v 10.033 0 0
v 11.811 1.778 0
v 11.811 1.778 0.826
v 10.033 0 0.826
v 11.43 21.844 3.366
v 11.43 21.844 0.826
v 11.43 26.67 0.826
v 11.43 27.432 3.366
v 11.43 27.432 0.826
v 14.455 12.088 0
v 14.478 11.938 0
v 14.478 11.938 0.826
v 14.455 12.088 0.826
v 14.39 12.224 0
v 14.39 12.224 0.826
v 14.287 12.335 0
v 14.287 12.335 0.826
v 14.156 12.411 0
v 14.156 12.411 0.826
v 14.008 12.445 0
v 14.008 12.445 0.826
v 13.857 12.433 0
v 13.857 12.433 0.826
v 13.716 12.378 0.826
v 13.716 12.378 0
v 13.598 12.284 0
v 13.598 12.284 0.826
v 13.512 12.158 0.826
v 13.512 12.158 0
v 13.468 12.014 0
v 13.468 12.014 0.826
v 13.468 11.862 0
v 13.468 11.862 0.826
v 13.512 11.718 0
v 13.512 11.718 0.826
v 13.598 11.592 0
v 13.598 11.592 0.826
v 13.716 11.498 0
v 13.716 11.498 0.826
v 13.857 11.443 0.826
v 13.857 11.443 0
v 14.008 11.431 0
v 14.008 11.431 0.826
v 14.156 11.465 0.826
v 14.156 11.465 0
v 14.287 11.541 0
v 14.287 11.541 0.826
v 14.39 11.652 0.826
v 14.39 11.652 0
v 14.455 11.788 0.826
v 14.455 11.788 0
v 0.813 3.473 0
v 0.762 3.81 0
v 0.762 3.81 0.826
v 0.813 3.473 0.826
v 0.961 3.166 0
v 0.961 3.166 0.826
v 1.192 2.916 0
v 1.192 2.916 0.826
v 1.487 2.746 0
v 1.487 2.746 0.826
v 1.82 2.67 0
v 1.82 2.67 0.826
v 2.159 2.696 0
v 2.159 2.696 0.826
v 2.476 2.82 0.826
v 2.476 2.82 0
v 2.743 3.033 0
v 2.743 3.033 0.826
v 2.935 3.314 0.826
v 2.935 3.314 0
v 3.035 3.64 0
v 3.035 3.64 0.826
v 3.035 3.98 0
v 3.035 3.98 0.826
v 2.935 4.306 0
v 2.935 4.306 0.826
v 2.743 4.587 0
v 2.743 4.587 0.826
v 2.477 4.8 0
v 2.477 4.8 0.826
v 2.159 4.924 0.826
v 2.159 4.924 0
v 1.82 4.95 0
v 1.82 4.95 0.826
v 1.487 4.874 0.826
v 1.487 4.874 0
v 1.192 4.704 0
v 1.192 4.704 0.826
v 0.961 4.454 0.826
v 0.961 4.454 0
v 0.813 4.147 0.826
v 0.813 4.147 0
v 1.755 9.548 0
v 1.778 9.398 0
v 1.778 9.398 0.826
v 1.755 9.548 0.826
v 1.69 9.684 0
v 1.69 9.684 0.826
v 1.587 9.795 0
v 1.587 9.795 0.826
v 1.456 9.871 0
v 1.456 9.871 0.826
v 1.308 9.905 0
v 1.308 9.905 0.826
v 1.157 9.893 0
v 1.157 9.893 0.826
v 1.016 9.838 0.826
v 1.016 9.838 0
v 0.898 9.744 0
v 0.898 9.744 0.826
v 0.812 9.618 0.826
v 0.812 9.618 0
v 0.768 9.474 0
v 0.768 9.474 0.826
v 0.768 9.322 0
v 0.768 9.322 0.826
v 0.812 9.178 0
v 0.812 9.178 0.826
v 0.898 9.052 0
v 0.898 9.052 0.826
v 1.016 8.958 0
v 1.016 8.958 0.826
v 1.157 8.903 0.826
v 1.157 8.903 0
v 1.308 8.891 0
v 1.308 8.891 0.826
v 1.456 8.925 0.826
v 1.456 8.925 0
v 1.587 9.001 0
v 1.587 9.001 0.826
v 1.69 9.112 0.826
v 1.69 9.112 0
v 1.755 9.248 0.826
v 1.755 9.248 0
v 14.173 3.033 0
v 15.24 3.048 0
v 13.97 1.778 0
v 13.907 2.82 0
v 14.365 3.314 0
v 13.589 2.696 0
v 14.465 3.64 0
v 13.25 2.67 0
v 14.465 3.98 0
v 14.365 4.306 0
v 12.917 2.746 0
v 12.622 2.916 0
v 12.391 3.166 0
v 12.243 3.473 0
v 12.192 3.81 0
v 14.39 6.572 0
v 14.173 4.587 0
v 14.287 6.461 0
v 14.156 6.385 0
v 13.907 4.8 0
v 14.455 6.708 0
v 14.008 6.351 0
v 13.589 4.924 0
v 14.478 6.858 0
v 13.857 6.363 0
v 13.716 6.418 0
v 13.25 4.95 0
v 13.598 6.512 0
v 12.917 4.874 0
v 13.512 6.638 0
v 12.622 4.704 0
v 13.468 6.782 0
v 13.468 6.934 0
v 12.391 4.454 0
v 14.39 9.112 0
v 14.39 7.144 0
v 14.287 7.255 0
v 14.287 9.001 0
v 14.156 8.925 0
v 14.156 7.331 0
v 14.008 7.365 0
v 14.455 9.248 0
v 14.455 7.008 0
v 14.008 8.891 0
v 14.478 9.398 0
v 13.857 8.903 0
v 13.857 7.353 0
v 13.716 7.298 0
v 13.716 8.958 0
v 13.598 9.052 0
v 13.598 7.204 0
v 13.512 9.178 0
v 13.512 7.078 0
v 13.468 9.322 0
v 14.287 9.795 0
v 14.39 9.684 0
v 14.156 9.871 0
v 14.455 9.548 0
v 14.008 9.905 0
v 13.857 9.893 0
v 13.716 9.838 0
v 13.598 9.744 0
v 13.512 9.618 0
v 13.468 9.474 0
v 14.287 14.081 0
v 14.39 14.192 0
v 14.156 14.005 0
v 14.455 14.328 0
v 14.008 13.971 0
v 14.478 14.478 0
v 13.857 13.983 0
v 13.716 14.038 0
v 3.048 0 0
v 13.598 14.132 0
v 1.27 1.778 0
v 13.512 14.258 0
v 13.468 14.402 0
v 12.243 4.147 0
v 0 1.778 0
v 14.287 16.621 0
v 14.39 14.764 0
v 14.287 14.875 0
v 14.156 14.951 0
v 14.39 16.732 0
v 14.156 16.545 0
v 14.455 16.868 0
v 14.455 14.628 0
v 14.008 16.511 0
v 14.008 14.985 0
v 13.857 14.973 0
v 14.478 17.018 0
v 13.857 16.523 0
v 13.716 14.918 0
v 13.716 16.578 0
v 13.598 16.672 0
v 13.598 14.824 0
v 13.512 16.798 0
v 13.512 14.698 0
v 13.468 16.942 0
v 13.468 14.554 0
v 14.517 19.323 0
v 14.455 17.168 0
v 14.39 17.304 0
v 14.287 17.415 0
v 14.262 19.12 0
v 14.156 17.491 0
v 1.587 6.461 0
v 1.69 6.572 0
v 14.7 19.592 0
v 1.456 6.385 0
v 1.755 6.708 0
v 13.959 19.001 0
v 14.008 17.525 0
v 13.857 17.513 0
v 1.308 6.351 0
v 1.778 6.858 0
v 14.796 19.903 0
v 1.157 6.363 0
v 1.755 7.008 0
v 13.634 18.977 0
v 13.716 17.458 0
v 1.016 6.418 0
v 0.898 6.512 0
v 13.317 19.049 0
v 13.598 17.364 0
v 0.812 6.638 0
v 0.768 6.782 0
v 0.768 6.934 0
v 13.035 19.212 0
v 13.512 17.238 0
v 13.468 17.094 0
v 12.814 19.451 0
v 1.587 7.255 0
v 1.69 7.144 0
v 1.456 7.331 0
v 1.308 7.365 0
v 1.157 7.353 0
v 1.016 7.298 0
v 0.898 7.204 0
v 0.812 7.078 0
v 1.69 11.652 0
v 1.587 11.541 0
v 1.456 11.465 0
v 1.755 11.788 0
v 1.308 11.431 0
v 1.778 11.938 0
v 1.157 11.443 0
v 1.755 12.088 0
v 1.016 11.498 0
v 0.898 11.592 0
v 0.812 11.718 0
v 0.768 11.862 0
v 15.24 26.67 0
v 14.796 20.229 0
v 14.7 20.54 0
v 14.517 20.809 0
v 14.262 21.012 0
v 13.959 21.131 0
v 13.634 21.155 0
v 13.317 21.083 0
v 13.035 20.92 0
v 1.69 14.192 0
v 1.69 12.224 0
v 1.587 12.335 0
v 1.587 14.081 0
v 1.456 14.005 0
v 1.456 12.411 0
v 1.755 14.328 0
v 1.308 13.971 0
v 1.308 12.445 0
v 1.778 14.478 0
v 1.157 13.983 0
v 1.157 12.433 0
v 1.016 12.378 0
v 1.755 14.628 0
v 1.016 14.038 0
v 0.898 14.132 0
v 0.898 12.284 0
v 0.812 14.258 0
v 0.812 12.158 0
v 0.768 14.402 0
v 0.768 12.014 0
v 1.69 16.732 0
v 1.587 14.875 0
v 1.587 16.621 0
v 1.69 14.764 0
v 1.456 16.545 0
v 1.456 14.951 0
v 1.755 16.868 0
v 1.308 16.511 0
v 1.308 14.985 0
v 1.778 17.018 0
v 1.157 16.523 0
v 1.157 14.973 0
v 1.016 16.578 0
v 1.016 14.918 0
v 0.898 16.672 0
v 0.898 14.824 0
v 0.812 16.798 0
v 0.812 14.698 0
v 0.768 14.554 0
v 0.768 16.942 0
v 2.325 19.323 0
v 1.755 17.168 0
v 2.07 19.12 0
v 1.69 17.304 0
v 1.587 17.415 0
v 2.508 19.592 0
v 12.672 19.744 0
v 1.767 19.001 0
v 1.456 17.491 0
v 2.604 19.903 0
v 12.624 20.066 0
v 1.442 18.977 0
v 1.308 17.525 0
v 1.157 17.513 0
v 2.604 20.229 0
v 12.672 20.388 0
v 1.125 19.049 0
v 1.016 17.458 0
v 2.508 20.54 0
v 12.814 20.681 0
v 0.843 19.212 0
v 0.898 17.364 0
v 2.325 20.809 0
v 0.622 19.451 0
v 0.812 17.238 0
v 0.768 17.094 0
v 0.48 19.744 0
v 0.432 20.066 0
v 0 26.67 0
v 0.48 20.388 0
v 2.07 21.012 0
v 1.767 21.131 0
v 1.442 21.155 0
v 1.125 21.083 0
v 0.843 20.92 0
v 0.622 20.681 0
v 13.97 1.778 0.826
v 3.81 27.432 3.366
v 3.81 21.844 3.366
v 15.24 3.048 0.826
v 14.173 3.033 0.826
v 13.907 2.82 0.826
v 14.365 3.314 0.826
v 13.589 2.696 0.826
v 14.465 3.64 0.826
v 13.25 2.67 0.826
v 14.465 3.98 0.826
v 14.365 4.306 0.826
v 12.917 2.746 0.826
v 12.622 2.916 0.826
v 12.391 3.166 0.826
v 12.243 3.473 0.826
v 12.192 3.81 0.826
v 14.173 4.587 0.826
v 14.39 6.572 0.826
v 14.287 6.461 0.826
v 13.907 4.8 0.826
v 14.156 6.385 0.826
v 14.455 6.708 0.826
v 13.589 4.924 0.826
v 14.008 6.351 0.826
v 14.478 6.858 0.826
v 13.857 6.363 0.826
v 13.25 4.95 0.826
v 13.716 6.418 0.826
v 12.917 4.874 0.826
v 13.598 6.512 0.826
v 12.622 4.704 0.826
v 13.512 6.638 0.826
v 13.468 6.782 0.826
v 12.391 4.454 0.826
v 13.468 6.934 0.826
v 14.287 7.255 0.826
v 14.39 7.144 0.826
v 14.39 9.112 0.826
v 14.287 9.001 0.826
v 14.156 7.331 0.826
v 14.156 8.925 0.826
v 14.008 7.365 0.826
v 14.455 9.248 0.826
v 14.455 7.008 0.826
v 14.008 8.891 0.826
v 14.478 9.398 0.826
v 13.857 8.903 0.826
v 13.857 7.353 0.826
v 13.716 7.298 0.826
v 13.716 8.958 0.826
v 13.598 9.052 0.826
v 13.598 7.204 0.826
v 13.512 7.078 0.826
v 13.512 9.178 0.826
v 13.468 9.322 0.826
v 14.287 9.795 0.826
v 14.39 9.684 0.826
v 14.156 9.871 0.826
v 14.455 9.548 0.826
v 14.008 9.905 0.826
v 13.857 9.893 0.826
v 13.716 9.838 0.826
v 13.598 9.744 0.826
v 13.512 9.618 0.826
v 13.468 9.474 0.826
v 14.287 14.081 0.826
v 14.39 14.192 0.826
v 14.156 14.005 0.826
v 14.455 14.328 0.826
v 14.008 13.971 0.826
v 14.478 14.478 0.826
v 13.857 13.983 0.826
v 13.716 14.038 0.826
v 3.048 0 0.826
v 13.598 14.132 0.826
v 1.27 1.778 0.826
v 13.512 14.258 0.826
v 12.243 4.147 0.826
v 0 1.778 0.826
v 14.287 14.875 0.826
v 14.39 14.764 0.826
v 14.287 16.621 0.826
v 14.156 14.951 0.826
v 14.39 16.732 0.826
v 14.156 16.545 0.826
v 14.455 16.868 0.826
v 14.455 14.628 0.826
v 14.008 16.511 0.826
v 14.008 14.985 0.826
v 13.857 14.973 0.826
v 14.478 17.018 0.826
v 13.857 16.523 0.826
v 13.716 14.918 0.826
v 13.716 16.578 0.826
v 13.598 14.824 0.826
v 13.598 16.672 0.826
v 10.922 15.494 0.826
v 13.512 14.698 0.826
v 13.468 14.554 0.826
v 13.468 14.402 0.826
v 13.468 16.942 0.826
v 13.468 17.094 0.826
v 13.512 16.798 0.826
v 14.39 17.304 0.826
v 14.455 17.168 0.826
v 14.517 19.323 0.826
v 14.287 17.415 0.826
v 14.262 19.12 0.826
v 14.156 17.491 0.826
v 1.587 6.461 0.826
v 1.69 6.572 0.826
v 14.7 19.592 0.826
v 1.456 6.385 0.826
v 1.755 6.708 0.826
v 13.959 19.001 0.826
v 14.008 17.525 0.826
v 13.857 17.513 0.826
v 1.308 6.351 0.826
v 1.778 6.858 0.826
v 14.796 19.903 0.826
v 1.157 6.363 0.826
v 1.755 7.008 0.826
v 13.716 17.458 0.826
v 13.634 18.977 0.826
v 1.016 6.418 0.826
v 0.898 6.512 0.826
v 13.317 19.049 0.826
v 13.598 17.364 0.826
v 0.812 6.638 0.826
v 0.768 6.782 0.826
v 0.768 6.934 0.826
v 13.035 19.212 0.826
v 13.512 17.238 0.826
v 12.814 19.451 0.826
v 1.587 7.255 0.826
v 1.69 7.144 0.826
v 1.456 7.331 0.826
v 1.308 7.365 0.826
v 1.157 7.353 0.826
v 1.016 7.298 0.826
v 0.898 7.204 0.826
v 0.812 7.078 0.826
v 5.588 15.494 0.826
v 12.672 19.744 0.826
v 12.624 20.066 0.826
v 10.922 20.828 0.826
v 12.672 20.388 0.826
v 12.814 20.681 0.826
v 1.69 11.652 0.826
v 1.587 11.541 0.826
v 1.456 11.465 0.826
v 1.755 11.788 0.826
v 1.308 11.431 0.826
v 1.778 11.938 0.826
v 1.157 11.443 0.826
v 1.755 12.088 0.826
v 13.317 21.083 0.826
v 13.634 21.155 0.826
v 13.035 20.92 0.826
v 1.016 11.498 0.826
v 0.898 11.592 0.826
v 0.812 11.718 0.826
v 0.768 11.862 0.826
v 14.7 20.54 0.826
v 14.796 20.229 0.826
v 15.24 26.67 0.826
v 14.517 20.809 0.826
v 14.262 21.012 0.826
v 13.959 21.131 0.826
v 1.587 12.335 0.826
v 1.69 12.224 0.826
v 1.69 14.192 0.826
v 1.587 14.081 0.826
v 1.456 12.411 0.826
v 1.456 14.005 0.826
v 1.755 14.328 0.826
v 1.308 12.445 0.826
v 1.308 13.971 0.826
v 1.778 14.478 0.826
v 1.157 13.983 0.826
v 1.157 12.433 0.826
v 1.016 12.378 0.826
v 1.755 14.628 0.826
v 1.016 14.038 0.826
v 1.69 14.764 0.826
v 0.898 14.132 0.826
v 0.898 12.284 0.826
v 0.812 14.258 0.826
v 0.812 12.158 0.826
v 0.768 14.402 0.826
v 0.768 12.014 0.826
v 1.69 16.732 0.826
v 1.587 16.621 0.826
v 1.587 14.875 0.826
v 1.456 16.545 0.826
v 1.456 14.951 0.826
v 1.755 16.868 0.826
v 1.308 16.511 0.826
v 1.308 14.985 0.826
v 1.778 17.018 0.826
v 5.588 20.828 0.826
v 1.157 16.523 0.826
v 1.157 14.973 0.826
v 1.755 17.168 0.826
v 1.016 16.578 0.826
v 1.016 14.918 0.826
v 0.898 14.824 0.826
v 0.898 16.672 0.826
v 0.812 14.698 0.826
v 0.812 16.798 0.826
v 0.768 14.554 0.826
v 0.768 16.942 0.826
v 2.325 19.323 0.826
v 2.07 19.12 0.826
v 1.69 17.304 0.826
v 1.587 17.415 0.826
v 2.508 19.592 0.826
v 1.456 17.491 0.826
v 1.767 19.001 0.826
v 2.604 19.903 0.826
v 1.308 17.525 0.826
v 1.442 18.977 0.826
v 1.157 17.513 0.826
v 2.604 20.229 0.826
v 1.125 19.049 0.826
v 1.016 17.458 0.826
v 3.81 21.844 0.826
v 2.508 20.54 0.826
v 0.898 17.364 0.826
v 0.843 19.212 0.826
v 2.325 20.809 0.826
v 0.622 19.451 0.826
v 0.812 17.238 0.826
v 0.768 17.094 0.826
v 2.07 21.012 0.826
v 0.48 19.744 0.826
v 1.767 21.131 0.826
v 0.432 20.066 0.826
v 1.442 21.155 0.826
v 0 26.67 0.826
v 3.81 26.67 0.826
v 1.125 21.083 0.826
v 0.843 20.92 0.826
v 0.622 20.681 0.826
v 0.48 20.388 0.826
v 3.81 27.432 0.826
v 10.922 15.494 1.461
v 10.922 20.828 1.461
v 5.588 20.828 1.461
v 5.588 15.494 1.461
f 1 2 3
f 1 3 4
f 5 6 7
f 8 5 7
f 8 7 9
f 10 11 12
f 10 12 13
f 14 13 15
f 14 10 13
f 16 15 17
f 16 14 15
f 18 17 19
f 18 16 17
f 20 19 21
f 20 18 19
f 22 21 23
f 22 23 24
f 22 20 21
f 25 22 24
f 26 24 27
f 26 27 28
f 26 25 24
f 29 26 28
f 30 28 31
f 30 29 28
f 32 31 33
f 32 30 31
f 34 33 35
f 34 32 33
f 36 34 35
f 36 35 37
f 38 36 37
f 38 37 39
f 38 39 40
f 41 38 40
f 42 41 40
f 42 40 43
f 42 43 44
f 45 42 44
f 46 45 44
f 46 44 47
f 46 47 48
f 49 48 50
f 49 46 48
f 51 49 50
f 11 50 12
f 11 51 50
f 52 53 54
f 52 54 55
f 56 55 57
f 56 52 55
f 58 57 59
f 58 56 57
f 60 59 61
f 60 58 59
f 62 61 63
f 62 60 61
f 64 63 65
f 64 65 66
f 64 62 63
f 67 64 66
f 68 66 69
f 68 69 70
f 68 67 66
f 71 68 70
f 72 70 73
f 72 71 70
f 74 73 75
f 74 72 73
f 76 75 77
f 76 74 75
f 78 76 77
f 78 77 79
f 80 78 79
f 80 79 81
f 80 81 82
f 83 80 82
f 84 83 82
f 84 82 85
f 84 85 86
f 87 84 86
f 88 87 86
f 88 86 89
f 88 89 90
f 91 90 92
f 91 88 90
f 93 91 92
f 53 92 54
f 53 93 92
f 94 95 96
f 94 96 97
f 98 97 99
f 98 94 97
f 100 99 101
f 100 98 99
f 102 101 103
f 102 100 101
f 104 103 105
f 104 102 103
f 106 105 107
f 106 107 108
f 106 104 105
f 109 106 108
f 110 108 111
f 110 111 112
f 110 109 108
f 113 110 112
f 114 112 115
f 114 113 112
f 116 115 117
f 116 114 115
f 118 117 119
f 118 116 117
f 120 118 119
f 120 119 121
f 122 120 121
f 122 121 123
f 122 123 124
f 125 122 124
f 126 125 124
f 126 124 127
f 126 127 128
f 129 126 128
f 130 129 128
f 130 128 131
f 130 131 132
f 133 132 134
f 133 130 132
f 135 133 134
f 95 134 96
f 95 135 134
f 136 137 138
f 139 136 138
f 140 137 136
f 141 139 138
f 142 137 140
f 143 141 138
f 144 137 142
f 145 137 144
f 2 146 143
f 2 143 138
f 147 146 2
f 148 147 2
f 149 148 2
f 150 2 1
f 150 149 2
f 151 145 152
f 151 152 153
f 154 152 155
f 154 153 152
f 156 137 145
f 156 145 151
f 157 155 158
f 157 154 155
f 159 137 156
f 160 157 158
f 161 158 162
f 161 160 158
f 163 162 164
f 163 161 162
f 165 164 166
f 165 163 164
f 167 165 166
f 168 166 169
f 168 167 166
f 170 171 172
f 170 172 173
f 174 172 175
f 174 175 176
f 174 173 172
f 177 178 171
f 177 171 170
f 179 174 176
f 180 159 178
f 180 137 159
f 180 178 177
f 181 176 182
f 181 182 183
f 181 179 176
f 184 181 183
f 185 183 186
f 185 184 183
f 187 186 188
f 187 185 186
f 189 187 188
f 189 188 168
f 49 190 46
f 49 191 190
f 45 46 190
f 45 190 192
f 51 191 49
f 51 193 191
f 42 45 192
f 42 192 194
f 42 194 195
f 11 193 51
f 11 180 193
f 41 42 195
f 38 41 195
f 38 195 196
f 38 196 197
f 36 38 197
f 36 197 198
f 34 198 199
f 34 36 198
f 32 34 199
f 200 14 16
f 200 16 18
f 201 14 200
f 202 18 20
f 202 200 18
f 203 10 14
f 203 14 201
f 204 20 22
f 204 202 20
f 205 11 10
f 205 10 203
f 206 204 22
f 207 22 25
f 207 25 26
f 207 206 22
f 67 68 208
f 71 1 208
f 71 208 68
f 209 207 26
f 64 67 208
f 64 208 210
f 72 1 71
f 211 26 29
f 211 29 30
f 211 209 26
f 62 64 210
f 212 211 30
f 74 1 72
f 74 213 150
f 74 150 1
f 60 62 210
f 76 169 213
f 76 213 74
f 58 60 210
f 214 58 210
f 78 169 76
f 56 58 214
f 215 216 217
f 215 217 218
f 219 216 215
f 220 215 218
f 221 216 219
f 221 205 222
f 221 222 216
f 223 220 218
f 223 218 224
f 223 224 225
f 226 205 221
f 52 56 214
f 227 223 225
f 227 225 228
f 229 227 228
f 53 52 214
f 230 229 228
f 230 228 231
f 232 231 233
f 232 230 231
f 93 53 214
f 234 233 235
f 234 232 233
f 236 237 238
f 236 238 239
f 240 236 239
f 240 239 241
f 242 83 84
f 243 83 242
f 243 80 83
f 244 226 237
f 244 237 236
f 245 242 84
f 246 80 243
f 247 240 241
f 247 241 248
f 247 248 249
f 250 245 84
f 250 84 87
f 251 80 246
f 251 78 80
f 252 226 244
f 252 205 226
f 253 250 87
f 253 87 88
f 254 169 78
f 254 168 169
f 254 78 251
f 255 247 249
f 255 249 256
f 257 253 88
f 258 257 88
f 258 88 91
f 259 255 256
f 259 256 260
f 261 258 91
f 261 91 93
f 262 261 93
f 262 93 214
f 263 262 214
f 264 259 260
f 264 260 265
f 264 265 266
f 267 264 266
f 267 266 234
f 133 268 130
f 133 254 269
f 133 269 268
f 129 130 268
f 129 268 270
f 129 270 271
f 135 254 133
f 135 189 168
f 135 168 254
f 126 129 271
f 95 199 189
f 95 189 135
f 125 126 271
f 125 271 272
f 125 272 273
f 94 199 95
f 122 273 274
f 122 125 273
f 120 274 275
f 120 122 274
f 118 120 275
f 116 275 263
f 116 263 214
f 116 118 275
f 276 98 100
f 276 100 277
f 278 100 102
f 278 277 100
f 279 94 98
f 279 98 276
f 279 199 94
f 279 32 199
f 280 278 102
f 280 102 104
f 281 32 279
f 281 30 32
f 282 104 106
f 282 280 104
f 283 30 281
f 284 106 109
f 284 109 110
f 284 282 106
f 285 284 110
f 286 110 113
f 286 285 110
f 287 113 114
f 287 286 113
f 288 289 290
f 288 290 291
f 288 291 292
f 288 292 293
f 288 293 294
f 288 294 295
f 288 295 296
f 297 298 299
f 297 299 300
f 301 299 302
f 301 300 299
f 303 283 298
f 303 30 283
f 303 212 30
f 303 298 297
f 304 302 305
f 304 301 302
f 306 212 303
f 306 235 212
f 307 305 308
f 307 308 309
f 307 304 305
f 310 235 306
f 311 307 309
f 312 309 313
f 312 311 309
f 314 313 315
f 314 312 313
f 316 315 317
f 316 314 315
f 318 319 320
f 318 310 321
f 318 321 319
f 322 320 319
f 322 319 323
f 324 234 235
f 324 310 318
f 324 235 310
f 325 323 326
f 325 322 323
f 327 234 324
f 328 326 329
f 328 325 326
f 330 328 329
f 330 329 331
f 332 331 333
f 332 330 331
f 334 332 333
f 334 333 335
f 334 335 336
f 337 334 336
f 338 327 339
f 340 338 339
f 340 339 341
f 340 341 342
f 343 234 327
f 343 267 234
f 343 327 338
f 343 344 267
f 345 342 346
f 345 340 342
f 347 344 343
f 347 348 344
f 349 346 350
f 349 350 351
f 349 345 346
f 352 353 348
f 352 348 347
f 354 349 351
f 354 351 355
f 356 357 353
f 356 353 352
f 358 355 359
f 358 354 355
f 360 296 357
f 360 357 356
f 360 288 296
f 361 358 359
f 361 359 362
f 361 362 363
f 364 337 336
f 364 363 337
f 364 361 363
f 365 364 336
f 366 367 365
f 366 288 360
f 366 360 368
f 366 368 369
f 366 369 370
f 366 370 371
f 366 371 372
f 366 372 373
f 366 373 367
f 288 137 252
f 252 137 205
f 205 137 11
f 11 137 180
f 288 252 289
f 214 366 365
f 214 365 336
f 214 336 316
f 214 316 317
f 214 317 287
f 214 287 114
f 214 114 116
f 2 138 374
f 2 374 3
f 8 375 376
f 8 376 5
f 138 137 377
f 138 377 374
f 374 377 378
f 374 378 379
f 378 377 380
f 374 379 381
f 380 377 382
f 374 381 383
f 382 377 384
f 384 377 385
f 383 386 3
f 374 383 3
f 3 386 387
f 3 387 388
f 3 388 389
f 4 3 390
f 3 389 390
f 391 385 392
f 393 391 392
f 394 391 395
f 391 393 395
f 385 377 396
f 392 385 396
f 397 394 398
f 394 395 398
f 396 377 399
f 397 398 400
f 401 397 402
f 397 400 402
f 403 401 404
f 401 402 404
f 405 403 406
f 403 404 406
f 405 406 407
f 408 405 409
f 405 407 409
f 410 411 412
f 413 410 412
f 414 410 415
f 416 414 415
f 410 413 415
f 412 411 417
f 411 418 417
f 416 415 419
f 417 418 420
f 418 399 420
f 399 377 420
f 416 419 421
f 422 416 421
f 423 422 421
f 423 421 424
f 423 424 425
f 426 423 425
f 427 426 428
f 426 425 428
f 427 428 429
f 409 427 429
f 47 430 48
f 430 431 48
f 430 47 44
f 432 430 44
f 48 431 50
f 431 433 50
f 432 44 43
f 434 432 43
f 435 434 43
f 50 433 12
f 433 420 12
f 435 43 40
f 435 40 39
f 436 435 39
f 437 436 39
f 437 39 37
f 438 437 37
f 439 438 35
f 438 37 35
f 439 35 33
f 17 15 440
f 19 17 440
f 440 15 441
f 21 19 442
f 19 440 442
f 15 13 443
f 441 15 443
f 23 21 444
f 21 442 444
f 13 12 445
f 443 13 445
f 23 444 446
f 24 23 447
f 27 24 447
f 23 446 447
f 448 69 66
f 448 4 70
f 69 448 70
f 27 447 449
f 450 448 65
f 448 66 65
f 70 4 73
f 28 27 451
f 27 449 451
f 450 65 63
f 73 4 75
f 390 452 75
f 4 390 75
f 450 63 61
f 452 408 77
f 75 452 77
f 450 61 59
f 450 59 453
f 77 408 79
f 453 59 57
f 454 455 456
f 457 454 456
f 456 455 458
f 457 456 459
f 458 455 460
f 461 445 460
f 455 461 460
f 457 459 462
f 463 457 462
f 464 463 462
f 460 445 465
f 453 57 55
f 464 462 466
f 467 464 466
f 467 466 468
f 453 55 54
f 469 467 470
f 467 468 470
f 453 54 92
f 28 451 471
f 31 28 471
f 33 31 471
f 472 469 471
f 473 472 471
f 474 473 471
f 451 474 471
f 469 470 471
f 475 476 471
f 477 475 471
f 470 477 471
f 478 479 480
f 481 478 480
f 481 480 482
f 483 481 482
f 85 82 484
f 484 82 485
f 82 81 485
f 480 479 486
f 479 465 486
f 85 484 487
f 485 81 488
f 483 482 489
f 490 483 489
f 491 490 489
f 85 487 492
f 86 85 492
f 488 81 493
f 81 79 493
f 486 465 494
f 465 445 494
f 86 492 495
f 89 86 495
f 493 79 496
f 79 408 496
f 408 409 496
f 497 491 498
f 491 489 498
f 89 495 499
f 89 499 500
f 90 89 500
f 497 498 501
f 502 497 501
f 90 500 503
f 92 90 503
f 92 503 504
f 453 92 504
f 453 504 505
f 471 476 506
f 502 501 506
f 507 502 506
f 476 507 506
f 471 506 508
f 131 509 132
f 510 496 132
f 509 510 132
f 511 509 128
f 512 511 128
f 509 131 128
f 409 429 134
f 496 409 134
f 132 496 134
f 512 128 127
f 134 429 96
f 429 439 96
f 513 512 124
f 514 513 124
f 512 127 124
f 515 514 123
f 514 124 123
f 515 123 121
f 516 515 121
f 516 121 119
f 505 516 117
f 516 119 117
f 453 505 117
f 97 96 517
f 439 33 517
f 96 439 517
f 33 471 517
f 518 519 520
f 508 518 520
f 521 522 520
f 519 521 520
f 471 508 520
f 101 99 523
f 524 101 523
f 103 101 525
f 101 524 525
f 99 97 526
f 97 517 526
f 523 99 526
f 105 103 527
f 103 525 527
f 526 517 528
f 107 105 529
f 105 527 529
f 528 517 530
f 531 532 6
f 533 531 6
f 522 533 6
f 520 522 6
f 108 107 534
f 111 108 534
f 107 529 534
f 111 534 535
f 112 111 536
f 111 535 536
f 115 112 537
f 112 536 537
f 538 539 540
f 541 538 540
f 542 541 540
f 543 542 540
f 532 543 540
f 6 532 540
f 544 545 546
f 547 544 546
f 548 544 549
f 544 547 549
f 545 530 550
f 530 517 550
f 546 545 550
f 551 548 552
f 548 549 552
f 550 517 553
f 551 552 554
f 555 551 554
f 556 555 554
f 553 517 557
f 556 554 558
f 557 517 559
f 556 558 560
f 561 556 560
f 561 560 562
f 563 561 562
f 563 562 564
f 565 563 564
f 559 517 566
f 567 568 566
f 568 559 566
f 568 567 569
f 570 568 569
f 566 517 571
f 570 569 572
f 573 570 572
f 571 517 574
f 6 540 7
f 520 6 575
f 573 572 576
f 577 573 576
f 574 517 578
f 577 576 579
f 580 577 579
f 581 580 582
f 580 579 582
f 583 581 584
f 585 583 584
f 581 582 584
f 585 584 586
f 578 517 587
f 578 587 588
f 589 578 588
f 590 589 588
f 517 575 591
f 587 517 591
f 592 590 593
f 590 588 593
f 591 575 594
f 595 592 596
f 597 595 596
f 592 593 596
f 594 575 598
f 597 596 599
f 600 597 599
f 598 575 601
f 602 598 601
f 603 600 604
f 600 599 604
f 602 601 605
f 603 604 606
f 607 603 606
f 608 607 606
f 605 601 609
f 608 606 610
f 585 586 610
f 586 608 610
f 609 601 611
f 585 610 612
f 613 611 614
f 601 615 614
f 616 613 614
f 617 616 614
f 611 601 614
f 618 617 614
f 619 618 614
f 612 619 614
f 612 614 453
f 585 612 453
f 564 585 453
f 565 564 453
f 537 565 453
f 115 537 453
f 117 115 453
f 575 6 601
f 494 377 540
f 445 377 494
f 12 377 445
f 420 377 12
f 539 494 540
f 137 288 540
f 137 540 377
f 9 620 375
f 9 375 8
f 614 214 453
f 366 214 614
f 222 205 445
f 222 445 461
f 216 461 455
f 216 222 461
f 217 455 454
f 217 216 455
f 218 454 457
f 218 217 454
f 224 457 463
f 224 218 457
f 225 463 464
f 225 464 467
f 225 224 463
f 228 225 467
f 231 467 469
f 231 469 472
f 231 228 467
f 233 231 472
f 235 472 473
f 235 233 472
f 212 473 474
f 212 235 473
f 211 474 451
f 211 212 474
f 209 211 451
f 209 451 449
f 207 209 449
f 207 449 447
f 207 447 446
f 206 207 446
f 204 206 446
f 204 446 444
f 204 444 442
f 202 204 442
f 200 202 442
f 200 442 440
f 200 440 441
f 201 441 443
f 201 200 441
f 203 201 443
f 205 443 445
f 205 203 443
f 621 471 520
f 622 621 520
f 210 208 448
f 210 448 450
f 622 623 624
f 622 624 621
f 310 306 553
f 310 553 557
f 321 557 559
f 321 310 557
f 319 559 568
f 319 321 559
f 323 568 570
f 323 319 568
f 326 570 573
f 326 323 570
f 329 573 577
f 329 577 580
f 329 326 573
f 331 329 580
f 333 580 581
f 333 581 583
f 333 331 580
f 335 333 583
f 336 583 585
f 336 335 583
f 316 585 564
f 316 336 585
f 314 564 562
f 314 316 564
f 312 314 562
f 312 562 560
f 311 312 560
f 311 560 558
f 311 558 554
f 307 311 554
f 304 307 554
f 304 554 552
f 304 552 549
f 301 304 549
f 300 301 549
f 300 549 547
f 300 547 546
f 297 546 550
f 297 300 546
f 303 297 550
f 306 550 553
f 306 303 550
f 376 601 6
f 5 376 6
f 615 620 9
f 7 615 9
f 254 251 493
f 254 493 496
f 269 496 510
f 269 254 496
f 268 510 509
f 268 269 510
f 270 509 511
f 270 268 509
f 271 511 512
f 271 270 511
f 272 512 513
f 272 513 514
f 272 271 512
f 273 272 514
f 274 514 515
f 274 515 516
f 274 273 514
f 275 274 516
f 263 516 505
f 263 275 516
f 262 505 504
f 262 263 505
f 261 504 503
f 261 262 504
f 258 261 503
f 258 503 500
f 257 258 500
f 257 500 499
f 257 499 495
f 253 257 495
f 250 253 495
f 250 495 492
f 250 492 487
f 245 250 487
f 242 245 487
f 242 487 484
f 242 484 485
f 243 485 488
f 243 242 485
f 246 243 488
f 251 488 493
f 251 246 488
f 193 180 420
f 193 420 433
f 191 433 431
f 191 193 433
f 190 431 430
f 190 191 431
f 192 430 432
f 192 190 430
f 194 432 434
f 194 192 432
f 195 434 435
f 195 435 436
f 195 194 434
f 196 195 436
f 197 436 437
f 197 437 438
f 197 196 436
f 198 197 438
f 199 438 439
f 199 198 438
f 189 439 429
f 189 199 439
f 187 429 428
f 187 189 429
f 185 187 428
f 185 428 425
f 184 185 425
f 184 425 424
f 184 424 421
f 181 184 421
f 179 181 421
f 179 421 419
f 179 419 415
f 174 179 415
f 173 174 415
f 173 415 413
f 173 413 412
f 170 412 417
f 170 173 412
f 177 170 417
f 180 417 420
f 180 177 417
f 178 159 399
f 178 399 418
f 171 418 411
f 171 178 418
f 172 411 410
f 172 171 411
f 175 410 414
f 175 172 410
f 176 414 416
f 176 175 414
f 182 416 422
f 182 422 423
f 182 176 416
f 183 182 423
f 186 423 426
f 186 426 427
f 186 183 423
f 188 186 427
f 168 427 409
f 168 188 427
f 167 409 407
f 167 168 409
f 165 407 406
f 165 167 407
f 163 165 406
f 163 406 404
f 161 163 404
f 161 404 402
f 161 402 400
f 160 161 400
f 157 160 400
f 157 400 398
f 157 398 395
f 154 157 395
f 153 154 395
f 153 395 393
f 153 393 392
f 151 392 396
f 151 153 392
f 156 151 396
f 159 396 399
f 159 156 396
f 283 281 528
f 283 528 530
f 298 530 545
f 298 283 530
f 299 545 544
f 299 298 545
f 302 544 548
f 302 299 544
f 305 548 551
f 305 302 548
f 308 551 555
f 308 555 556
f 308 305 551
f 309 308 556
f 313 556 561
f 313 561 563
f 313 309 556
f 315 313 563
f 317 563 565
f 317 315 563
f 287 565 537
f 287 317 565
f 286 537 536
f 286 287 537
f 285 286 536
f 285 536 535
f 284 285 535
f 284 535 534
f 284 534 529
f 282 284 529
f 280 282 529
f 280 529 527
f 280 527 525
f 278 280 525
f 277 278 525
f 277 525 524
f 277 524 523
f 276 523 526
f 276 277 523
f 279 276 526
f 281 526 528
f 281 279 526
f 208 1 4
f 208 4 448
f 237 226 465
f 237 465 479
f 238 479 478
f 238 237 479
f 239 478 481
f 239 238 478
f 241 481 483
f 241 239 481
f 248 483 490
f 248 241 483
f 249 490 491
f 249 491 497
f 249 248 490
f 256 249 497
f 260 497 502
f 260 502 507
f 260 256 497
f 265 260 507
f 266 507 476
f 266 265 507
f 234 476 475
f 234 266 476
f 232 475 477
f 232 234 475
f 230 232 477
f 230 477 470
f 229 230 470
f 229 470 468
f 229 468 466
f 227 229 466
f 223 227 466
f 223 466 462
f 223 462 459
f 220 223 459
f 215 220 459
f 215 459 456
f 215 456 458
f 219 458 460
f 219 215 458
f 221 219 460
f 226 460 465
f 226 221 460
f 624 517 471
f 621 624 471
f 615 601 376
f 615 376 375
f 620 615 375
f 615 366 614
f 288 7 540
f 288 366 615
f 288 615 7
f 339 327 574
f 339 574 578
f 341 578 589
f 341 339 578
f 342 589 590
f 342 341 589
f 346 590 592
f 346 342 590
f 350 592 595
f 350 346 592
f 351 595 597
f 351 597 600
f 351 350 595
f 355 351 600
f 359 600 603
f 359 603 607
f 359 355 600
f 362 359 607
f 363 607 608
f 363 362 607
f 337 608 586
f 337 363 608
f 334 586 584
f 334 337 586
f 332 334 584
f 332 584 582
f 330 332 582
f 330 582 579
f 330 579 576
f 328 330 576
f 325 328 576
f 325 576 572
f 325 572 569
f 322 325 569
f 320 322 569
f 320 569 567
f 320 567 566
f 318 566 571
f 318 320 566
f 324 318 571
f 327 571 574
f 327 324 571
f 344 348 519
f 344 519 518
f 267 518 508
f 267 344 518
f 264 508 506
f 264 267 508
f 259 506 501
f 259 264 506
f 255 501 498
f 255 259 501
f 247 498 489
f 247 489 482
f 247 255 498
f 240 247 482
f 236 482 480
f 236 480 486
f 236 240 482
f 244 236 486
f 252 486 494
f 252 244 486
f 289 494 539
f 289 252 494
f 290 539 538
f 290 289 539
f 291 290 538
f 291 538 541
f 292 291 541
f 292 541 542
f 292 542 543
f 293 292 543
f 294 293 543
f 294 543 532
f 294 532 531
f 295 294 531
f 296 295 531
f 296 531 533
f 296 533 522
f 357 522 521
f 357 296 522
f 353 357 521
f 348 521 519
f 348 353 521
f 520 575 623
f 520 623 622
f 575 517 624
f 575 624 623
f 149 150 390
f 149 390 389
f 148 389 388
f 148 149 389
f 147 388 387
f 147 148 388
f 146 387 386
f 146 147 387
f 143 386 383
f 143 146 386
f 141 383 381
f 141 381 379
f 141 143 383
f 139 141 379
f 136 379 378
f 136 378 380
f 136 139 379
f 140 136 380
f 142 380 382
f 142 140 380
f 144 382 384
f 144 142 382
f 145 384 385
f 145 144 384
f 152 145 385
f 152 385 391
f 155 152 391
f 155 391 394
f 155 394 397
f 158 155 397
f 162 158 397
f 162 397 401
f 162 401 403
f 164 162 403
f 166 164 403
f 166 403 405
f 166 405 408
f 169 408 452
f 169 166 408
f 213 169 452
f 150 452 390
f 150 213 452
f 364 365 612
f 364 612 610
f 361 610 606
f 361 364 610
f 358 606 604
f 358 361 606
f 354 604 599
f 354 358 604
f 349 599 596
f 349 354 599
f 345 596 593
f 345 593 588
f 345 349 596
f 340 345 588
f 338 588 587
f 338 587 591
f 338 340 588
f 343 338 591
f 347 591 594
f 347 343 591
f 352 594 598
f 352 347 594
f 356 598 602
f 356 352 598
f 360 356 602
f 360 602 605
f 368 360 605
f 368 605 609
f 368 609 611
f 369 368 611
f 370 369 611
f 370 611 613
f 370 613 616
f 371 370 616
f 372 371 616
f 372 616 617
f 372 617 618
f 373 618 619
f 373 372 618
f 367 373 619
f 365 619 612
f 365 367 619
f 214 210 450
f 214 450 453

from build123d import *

# Parameters (mm, degrees)
SKETCH1_R           = 1.143
SKETCH1_R_2         = 0.508
SKETCH1_R_3         = 1.0922
BOSS_EXTRUDE1_DEPTH = 0.8255
SKETCH2_W           = 7.62
SKETCH2_H           = 5.588
BOSS_EXTRUDE2_DEPTH = 2.54
SKETCH3_W           = 5.334
SKETCH3_H           = 5.334
BOSS_EXTRUDE3_DEPTH = 0.635


with BuildPart() as part:
    # Sketch1 → Boss-Extrude1 (new body)
    with BuildSketch(Plane.XY):
        Polygon((0, 26.67), (15.24, 26.67), (15.24, 3.048), (13.97, 1.778), (11.811, 1.778), (10.033, 0), (3.048, 0), (1.27, 1.778), (0, 1.778), align=None)
        with Locations(Location((1.905, 3.81, 0), (0, 0, 180))):
            Circle(SKETCH1_R, mode=Mode.SUBTRACT)
        with Locations(Location((13.335, 3.81, 0), (0, 0, 180))):
            Circle(SKETCH1_R, mode=Mode.SUBTRACT)
        with Locations((1.27, 6.858)):
            Circle(SKETCH1_R_2, mode=Mode.SUBTRACT)
        with Locations((1.27, 9.398)):
            Circle(SKETCH1_R_2, mode=Mode.SUBTRACT)
        with Locations((1.27, 11.938)):
            Circle(SKETCH1_R_2, mode=Mode.SUBTRACT)
        with Locations((1.27, 14.478)):
            Circle(SKETCH1_R_2, mode=Mode.SUBTRACT)
        with Locations((1.27, 17.018)):
            Circle(SKETCH1_R_2, mode=Mode.SUBTRACT)
        with Locations((13.97, 17.018)):
            Circle(SKETCH1_R_2, mode=Mode.SUBTRACT)
        with Locations((13.97, 14.478)):
            Circle(SKETCH1_R_2, mode=Mode.SUBTRACT)
        with Locations((13.97, 11.938)):
            Circle(SKETCH1_R_2, mode=Mode.SUBTRACT)
        with Locations((13.97, 9.398)):
            Circle(SKETCH1_R_2, mode=Mode.SUBTRACT)
        with Locations((13.97, 6.858)):
            Circle(SKETCH1_R_2, mode=Mode.SUBTRACT)
        with Locations(Location((1.524, 20.066, 0), (0, 0, 180))):
            Circle(SKETCH1_R_3, mode=Mode.SUBTRACT)
        with Locations(Location((13.716, 20.066, 0), (0, 0, 180))):
            Circle(SKETCH1_R_3, mode=Mode.SUBTRACT)
    extrude(amount=BOSS_EXTRUDE1_DEPTH)

    # Sketch2 → Boss-Extrude2 (add)
    with BuildSketch(Plane.XY.offset(0.8255)):
        with Locations((7.62, 24.638)):
            Rectangle(SKETCH2_W, SKETCH2_H)
    extrude(amount=BOSS_EXTRUDE2_DEPTH)

    # Sketch3 → Boss-Extrude3 (add)
    with BuildSketch(Plane.XY.offset(0.8255)):
        with Locations((8.255, 18.161)):
            Rectangle(SKETCH3_W, SKETCH3_H)
    extrude(amount=BOSS_EXTRUDE3_DEPTH)


solid = part.part
